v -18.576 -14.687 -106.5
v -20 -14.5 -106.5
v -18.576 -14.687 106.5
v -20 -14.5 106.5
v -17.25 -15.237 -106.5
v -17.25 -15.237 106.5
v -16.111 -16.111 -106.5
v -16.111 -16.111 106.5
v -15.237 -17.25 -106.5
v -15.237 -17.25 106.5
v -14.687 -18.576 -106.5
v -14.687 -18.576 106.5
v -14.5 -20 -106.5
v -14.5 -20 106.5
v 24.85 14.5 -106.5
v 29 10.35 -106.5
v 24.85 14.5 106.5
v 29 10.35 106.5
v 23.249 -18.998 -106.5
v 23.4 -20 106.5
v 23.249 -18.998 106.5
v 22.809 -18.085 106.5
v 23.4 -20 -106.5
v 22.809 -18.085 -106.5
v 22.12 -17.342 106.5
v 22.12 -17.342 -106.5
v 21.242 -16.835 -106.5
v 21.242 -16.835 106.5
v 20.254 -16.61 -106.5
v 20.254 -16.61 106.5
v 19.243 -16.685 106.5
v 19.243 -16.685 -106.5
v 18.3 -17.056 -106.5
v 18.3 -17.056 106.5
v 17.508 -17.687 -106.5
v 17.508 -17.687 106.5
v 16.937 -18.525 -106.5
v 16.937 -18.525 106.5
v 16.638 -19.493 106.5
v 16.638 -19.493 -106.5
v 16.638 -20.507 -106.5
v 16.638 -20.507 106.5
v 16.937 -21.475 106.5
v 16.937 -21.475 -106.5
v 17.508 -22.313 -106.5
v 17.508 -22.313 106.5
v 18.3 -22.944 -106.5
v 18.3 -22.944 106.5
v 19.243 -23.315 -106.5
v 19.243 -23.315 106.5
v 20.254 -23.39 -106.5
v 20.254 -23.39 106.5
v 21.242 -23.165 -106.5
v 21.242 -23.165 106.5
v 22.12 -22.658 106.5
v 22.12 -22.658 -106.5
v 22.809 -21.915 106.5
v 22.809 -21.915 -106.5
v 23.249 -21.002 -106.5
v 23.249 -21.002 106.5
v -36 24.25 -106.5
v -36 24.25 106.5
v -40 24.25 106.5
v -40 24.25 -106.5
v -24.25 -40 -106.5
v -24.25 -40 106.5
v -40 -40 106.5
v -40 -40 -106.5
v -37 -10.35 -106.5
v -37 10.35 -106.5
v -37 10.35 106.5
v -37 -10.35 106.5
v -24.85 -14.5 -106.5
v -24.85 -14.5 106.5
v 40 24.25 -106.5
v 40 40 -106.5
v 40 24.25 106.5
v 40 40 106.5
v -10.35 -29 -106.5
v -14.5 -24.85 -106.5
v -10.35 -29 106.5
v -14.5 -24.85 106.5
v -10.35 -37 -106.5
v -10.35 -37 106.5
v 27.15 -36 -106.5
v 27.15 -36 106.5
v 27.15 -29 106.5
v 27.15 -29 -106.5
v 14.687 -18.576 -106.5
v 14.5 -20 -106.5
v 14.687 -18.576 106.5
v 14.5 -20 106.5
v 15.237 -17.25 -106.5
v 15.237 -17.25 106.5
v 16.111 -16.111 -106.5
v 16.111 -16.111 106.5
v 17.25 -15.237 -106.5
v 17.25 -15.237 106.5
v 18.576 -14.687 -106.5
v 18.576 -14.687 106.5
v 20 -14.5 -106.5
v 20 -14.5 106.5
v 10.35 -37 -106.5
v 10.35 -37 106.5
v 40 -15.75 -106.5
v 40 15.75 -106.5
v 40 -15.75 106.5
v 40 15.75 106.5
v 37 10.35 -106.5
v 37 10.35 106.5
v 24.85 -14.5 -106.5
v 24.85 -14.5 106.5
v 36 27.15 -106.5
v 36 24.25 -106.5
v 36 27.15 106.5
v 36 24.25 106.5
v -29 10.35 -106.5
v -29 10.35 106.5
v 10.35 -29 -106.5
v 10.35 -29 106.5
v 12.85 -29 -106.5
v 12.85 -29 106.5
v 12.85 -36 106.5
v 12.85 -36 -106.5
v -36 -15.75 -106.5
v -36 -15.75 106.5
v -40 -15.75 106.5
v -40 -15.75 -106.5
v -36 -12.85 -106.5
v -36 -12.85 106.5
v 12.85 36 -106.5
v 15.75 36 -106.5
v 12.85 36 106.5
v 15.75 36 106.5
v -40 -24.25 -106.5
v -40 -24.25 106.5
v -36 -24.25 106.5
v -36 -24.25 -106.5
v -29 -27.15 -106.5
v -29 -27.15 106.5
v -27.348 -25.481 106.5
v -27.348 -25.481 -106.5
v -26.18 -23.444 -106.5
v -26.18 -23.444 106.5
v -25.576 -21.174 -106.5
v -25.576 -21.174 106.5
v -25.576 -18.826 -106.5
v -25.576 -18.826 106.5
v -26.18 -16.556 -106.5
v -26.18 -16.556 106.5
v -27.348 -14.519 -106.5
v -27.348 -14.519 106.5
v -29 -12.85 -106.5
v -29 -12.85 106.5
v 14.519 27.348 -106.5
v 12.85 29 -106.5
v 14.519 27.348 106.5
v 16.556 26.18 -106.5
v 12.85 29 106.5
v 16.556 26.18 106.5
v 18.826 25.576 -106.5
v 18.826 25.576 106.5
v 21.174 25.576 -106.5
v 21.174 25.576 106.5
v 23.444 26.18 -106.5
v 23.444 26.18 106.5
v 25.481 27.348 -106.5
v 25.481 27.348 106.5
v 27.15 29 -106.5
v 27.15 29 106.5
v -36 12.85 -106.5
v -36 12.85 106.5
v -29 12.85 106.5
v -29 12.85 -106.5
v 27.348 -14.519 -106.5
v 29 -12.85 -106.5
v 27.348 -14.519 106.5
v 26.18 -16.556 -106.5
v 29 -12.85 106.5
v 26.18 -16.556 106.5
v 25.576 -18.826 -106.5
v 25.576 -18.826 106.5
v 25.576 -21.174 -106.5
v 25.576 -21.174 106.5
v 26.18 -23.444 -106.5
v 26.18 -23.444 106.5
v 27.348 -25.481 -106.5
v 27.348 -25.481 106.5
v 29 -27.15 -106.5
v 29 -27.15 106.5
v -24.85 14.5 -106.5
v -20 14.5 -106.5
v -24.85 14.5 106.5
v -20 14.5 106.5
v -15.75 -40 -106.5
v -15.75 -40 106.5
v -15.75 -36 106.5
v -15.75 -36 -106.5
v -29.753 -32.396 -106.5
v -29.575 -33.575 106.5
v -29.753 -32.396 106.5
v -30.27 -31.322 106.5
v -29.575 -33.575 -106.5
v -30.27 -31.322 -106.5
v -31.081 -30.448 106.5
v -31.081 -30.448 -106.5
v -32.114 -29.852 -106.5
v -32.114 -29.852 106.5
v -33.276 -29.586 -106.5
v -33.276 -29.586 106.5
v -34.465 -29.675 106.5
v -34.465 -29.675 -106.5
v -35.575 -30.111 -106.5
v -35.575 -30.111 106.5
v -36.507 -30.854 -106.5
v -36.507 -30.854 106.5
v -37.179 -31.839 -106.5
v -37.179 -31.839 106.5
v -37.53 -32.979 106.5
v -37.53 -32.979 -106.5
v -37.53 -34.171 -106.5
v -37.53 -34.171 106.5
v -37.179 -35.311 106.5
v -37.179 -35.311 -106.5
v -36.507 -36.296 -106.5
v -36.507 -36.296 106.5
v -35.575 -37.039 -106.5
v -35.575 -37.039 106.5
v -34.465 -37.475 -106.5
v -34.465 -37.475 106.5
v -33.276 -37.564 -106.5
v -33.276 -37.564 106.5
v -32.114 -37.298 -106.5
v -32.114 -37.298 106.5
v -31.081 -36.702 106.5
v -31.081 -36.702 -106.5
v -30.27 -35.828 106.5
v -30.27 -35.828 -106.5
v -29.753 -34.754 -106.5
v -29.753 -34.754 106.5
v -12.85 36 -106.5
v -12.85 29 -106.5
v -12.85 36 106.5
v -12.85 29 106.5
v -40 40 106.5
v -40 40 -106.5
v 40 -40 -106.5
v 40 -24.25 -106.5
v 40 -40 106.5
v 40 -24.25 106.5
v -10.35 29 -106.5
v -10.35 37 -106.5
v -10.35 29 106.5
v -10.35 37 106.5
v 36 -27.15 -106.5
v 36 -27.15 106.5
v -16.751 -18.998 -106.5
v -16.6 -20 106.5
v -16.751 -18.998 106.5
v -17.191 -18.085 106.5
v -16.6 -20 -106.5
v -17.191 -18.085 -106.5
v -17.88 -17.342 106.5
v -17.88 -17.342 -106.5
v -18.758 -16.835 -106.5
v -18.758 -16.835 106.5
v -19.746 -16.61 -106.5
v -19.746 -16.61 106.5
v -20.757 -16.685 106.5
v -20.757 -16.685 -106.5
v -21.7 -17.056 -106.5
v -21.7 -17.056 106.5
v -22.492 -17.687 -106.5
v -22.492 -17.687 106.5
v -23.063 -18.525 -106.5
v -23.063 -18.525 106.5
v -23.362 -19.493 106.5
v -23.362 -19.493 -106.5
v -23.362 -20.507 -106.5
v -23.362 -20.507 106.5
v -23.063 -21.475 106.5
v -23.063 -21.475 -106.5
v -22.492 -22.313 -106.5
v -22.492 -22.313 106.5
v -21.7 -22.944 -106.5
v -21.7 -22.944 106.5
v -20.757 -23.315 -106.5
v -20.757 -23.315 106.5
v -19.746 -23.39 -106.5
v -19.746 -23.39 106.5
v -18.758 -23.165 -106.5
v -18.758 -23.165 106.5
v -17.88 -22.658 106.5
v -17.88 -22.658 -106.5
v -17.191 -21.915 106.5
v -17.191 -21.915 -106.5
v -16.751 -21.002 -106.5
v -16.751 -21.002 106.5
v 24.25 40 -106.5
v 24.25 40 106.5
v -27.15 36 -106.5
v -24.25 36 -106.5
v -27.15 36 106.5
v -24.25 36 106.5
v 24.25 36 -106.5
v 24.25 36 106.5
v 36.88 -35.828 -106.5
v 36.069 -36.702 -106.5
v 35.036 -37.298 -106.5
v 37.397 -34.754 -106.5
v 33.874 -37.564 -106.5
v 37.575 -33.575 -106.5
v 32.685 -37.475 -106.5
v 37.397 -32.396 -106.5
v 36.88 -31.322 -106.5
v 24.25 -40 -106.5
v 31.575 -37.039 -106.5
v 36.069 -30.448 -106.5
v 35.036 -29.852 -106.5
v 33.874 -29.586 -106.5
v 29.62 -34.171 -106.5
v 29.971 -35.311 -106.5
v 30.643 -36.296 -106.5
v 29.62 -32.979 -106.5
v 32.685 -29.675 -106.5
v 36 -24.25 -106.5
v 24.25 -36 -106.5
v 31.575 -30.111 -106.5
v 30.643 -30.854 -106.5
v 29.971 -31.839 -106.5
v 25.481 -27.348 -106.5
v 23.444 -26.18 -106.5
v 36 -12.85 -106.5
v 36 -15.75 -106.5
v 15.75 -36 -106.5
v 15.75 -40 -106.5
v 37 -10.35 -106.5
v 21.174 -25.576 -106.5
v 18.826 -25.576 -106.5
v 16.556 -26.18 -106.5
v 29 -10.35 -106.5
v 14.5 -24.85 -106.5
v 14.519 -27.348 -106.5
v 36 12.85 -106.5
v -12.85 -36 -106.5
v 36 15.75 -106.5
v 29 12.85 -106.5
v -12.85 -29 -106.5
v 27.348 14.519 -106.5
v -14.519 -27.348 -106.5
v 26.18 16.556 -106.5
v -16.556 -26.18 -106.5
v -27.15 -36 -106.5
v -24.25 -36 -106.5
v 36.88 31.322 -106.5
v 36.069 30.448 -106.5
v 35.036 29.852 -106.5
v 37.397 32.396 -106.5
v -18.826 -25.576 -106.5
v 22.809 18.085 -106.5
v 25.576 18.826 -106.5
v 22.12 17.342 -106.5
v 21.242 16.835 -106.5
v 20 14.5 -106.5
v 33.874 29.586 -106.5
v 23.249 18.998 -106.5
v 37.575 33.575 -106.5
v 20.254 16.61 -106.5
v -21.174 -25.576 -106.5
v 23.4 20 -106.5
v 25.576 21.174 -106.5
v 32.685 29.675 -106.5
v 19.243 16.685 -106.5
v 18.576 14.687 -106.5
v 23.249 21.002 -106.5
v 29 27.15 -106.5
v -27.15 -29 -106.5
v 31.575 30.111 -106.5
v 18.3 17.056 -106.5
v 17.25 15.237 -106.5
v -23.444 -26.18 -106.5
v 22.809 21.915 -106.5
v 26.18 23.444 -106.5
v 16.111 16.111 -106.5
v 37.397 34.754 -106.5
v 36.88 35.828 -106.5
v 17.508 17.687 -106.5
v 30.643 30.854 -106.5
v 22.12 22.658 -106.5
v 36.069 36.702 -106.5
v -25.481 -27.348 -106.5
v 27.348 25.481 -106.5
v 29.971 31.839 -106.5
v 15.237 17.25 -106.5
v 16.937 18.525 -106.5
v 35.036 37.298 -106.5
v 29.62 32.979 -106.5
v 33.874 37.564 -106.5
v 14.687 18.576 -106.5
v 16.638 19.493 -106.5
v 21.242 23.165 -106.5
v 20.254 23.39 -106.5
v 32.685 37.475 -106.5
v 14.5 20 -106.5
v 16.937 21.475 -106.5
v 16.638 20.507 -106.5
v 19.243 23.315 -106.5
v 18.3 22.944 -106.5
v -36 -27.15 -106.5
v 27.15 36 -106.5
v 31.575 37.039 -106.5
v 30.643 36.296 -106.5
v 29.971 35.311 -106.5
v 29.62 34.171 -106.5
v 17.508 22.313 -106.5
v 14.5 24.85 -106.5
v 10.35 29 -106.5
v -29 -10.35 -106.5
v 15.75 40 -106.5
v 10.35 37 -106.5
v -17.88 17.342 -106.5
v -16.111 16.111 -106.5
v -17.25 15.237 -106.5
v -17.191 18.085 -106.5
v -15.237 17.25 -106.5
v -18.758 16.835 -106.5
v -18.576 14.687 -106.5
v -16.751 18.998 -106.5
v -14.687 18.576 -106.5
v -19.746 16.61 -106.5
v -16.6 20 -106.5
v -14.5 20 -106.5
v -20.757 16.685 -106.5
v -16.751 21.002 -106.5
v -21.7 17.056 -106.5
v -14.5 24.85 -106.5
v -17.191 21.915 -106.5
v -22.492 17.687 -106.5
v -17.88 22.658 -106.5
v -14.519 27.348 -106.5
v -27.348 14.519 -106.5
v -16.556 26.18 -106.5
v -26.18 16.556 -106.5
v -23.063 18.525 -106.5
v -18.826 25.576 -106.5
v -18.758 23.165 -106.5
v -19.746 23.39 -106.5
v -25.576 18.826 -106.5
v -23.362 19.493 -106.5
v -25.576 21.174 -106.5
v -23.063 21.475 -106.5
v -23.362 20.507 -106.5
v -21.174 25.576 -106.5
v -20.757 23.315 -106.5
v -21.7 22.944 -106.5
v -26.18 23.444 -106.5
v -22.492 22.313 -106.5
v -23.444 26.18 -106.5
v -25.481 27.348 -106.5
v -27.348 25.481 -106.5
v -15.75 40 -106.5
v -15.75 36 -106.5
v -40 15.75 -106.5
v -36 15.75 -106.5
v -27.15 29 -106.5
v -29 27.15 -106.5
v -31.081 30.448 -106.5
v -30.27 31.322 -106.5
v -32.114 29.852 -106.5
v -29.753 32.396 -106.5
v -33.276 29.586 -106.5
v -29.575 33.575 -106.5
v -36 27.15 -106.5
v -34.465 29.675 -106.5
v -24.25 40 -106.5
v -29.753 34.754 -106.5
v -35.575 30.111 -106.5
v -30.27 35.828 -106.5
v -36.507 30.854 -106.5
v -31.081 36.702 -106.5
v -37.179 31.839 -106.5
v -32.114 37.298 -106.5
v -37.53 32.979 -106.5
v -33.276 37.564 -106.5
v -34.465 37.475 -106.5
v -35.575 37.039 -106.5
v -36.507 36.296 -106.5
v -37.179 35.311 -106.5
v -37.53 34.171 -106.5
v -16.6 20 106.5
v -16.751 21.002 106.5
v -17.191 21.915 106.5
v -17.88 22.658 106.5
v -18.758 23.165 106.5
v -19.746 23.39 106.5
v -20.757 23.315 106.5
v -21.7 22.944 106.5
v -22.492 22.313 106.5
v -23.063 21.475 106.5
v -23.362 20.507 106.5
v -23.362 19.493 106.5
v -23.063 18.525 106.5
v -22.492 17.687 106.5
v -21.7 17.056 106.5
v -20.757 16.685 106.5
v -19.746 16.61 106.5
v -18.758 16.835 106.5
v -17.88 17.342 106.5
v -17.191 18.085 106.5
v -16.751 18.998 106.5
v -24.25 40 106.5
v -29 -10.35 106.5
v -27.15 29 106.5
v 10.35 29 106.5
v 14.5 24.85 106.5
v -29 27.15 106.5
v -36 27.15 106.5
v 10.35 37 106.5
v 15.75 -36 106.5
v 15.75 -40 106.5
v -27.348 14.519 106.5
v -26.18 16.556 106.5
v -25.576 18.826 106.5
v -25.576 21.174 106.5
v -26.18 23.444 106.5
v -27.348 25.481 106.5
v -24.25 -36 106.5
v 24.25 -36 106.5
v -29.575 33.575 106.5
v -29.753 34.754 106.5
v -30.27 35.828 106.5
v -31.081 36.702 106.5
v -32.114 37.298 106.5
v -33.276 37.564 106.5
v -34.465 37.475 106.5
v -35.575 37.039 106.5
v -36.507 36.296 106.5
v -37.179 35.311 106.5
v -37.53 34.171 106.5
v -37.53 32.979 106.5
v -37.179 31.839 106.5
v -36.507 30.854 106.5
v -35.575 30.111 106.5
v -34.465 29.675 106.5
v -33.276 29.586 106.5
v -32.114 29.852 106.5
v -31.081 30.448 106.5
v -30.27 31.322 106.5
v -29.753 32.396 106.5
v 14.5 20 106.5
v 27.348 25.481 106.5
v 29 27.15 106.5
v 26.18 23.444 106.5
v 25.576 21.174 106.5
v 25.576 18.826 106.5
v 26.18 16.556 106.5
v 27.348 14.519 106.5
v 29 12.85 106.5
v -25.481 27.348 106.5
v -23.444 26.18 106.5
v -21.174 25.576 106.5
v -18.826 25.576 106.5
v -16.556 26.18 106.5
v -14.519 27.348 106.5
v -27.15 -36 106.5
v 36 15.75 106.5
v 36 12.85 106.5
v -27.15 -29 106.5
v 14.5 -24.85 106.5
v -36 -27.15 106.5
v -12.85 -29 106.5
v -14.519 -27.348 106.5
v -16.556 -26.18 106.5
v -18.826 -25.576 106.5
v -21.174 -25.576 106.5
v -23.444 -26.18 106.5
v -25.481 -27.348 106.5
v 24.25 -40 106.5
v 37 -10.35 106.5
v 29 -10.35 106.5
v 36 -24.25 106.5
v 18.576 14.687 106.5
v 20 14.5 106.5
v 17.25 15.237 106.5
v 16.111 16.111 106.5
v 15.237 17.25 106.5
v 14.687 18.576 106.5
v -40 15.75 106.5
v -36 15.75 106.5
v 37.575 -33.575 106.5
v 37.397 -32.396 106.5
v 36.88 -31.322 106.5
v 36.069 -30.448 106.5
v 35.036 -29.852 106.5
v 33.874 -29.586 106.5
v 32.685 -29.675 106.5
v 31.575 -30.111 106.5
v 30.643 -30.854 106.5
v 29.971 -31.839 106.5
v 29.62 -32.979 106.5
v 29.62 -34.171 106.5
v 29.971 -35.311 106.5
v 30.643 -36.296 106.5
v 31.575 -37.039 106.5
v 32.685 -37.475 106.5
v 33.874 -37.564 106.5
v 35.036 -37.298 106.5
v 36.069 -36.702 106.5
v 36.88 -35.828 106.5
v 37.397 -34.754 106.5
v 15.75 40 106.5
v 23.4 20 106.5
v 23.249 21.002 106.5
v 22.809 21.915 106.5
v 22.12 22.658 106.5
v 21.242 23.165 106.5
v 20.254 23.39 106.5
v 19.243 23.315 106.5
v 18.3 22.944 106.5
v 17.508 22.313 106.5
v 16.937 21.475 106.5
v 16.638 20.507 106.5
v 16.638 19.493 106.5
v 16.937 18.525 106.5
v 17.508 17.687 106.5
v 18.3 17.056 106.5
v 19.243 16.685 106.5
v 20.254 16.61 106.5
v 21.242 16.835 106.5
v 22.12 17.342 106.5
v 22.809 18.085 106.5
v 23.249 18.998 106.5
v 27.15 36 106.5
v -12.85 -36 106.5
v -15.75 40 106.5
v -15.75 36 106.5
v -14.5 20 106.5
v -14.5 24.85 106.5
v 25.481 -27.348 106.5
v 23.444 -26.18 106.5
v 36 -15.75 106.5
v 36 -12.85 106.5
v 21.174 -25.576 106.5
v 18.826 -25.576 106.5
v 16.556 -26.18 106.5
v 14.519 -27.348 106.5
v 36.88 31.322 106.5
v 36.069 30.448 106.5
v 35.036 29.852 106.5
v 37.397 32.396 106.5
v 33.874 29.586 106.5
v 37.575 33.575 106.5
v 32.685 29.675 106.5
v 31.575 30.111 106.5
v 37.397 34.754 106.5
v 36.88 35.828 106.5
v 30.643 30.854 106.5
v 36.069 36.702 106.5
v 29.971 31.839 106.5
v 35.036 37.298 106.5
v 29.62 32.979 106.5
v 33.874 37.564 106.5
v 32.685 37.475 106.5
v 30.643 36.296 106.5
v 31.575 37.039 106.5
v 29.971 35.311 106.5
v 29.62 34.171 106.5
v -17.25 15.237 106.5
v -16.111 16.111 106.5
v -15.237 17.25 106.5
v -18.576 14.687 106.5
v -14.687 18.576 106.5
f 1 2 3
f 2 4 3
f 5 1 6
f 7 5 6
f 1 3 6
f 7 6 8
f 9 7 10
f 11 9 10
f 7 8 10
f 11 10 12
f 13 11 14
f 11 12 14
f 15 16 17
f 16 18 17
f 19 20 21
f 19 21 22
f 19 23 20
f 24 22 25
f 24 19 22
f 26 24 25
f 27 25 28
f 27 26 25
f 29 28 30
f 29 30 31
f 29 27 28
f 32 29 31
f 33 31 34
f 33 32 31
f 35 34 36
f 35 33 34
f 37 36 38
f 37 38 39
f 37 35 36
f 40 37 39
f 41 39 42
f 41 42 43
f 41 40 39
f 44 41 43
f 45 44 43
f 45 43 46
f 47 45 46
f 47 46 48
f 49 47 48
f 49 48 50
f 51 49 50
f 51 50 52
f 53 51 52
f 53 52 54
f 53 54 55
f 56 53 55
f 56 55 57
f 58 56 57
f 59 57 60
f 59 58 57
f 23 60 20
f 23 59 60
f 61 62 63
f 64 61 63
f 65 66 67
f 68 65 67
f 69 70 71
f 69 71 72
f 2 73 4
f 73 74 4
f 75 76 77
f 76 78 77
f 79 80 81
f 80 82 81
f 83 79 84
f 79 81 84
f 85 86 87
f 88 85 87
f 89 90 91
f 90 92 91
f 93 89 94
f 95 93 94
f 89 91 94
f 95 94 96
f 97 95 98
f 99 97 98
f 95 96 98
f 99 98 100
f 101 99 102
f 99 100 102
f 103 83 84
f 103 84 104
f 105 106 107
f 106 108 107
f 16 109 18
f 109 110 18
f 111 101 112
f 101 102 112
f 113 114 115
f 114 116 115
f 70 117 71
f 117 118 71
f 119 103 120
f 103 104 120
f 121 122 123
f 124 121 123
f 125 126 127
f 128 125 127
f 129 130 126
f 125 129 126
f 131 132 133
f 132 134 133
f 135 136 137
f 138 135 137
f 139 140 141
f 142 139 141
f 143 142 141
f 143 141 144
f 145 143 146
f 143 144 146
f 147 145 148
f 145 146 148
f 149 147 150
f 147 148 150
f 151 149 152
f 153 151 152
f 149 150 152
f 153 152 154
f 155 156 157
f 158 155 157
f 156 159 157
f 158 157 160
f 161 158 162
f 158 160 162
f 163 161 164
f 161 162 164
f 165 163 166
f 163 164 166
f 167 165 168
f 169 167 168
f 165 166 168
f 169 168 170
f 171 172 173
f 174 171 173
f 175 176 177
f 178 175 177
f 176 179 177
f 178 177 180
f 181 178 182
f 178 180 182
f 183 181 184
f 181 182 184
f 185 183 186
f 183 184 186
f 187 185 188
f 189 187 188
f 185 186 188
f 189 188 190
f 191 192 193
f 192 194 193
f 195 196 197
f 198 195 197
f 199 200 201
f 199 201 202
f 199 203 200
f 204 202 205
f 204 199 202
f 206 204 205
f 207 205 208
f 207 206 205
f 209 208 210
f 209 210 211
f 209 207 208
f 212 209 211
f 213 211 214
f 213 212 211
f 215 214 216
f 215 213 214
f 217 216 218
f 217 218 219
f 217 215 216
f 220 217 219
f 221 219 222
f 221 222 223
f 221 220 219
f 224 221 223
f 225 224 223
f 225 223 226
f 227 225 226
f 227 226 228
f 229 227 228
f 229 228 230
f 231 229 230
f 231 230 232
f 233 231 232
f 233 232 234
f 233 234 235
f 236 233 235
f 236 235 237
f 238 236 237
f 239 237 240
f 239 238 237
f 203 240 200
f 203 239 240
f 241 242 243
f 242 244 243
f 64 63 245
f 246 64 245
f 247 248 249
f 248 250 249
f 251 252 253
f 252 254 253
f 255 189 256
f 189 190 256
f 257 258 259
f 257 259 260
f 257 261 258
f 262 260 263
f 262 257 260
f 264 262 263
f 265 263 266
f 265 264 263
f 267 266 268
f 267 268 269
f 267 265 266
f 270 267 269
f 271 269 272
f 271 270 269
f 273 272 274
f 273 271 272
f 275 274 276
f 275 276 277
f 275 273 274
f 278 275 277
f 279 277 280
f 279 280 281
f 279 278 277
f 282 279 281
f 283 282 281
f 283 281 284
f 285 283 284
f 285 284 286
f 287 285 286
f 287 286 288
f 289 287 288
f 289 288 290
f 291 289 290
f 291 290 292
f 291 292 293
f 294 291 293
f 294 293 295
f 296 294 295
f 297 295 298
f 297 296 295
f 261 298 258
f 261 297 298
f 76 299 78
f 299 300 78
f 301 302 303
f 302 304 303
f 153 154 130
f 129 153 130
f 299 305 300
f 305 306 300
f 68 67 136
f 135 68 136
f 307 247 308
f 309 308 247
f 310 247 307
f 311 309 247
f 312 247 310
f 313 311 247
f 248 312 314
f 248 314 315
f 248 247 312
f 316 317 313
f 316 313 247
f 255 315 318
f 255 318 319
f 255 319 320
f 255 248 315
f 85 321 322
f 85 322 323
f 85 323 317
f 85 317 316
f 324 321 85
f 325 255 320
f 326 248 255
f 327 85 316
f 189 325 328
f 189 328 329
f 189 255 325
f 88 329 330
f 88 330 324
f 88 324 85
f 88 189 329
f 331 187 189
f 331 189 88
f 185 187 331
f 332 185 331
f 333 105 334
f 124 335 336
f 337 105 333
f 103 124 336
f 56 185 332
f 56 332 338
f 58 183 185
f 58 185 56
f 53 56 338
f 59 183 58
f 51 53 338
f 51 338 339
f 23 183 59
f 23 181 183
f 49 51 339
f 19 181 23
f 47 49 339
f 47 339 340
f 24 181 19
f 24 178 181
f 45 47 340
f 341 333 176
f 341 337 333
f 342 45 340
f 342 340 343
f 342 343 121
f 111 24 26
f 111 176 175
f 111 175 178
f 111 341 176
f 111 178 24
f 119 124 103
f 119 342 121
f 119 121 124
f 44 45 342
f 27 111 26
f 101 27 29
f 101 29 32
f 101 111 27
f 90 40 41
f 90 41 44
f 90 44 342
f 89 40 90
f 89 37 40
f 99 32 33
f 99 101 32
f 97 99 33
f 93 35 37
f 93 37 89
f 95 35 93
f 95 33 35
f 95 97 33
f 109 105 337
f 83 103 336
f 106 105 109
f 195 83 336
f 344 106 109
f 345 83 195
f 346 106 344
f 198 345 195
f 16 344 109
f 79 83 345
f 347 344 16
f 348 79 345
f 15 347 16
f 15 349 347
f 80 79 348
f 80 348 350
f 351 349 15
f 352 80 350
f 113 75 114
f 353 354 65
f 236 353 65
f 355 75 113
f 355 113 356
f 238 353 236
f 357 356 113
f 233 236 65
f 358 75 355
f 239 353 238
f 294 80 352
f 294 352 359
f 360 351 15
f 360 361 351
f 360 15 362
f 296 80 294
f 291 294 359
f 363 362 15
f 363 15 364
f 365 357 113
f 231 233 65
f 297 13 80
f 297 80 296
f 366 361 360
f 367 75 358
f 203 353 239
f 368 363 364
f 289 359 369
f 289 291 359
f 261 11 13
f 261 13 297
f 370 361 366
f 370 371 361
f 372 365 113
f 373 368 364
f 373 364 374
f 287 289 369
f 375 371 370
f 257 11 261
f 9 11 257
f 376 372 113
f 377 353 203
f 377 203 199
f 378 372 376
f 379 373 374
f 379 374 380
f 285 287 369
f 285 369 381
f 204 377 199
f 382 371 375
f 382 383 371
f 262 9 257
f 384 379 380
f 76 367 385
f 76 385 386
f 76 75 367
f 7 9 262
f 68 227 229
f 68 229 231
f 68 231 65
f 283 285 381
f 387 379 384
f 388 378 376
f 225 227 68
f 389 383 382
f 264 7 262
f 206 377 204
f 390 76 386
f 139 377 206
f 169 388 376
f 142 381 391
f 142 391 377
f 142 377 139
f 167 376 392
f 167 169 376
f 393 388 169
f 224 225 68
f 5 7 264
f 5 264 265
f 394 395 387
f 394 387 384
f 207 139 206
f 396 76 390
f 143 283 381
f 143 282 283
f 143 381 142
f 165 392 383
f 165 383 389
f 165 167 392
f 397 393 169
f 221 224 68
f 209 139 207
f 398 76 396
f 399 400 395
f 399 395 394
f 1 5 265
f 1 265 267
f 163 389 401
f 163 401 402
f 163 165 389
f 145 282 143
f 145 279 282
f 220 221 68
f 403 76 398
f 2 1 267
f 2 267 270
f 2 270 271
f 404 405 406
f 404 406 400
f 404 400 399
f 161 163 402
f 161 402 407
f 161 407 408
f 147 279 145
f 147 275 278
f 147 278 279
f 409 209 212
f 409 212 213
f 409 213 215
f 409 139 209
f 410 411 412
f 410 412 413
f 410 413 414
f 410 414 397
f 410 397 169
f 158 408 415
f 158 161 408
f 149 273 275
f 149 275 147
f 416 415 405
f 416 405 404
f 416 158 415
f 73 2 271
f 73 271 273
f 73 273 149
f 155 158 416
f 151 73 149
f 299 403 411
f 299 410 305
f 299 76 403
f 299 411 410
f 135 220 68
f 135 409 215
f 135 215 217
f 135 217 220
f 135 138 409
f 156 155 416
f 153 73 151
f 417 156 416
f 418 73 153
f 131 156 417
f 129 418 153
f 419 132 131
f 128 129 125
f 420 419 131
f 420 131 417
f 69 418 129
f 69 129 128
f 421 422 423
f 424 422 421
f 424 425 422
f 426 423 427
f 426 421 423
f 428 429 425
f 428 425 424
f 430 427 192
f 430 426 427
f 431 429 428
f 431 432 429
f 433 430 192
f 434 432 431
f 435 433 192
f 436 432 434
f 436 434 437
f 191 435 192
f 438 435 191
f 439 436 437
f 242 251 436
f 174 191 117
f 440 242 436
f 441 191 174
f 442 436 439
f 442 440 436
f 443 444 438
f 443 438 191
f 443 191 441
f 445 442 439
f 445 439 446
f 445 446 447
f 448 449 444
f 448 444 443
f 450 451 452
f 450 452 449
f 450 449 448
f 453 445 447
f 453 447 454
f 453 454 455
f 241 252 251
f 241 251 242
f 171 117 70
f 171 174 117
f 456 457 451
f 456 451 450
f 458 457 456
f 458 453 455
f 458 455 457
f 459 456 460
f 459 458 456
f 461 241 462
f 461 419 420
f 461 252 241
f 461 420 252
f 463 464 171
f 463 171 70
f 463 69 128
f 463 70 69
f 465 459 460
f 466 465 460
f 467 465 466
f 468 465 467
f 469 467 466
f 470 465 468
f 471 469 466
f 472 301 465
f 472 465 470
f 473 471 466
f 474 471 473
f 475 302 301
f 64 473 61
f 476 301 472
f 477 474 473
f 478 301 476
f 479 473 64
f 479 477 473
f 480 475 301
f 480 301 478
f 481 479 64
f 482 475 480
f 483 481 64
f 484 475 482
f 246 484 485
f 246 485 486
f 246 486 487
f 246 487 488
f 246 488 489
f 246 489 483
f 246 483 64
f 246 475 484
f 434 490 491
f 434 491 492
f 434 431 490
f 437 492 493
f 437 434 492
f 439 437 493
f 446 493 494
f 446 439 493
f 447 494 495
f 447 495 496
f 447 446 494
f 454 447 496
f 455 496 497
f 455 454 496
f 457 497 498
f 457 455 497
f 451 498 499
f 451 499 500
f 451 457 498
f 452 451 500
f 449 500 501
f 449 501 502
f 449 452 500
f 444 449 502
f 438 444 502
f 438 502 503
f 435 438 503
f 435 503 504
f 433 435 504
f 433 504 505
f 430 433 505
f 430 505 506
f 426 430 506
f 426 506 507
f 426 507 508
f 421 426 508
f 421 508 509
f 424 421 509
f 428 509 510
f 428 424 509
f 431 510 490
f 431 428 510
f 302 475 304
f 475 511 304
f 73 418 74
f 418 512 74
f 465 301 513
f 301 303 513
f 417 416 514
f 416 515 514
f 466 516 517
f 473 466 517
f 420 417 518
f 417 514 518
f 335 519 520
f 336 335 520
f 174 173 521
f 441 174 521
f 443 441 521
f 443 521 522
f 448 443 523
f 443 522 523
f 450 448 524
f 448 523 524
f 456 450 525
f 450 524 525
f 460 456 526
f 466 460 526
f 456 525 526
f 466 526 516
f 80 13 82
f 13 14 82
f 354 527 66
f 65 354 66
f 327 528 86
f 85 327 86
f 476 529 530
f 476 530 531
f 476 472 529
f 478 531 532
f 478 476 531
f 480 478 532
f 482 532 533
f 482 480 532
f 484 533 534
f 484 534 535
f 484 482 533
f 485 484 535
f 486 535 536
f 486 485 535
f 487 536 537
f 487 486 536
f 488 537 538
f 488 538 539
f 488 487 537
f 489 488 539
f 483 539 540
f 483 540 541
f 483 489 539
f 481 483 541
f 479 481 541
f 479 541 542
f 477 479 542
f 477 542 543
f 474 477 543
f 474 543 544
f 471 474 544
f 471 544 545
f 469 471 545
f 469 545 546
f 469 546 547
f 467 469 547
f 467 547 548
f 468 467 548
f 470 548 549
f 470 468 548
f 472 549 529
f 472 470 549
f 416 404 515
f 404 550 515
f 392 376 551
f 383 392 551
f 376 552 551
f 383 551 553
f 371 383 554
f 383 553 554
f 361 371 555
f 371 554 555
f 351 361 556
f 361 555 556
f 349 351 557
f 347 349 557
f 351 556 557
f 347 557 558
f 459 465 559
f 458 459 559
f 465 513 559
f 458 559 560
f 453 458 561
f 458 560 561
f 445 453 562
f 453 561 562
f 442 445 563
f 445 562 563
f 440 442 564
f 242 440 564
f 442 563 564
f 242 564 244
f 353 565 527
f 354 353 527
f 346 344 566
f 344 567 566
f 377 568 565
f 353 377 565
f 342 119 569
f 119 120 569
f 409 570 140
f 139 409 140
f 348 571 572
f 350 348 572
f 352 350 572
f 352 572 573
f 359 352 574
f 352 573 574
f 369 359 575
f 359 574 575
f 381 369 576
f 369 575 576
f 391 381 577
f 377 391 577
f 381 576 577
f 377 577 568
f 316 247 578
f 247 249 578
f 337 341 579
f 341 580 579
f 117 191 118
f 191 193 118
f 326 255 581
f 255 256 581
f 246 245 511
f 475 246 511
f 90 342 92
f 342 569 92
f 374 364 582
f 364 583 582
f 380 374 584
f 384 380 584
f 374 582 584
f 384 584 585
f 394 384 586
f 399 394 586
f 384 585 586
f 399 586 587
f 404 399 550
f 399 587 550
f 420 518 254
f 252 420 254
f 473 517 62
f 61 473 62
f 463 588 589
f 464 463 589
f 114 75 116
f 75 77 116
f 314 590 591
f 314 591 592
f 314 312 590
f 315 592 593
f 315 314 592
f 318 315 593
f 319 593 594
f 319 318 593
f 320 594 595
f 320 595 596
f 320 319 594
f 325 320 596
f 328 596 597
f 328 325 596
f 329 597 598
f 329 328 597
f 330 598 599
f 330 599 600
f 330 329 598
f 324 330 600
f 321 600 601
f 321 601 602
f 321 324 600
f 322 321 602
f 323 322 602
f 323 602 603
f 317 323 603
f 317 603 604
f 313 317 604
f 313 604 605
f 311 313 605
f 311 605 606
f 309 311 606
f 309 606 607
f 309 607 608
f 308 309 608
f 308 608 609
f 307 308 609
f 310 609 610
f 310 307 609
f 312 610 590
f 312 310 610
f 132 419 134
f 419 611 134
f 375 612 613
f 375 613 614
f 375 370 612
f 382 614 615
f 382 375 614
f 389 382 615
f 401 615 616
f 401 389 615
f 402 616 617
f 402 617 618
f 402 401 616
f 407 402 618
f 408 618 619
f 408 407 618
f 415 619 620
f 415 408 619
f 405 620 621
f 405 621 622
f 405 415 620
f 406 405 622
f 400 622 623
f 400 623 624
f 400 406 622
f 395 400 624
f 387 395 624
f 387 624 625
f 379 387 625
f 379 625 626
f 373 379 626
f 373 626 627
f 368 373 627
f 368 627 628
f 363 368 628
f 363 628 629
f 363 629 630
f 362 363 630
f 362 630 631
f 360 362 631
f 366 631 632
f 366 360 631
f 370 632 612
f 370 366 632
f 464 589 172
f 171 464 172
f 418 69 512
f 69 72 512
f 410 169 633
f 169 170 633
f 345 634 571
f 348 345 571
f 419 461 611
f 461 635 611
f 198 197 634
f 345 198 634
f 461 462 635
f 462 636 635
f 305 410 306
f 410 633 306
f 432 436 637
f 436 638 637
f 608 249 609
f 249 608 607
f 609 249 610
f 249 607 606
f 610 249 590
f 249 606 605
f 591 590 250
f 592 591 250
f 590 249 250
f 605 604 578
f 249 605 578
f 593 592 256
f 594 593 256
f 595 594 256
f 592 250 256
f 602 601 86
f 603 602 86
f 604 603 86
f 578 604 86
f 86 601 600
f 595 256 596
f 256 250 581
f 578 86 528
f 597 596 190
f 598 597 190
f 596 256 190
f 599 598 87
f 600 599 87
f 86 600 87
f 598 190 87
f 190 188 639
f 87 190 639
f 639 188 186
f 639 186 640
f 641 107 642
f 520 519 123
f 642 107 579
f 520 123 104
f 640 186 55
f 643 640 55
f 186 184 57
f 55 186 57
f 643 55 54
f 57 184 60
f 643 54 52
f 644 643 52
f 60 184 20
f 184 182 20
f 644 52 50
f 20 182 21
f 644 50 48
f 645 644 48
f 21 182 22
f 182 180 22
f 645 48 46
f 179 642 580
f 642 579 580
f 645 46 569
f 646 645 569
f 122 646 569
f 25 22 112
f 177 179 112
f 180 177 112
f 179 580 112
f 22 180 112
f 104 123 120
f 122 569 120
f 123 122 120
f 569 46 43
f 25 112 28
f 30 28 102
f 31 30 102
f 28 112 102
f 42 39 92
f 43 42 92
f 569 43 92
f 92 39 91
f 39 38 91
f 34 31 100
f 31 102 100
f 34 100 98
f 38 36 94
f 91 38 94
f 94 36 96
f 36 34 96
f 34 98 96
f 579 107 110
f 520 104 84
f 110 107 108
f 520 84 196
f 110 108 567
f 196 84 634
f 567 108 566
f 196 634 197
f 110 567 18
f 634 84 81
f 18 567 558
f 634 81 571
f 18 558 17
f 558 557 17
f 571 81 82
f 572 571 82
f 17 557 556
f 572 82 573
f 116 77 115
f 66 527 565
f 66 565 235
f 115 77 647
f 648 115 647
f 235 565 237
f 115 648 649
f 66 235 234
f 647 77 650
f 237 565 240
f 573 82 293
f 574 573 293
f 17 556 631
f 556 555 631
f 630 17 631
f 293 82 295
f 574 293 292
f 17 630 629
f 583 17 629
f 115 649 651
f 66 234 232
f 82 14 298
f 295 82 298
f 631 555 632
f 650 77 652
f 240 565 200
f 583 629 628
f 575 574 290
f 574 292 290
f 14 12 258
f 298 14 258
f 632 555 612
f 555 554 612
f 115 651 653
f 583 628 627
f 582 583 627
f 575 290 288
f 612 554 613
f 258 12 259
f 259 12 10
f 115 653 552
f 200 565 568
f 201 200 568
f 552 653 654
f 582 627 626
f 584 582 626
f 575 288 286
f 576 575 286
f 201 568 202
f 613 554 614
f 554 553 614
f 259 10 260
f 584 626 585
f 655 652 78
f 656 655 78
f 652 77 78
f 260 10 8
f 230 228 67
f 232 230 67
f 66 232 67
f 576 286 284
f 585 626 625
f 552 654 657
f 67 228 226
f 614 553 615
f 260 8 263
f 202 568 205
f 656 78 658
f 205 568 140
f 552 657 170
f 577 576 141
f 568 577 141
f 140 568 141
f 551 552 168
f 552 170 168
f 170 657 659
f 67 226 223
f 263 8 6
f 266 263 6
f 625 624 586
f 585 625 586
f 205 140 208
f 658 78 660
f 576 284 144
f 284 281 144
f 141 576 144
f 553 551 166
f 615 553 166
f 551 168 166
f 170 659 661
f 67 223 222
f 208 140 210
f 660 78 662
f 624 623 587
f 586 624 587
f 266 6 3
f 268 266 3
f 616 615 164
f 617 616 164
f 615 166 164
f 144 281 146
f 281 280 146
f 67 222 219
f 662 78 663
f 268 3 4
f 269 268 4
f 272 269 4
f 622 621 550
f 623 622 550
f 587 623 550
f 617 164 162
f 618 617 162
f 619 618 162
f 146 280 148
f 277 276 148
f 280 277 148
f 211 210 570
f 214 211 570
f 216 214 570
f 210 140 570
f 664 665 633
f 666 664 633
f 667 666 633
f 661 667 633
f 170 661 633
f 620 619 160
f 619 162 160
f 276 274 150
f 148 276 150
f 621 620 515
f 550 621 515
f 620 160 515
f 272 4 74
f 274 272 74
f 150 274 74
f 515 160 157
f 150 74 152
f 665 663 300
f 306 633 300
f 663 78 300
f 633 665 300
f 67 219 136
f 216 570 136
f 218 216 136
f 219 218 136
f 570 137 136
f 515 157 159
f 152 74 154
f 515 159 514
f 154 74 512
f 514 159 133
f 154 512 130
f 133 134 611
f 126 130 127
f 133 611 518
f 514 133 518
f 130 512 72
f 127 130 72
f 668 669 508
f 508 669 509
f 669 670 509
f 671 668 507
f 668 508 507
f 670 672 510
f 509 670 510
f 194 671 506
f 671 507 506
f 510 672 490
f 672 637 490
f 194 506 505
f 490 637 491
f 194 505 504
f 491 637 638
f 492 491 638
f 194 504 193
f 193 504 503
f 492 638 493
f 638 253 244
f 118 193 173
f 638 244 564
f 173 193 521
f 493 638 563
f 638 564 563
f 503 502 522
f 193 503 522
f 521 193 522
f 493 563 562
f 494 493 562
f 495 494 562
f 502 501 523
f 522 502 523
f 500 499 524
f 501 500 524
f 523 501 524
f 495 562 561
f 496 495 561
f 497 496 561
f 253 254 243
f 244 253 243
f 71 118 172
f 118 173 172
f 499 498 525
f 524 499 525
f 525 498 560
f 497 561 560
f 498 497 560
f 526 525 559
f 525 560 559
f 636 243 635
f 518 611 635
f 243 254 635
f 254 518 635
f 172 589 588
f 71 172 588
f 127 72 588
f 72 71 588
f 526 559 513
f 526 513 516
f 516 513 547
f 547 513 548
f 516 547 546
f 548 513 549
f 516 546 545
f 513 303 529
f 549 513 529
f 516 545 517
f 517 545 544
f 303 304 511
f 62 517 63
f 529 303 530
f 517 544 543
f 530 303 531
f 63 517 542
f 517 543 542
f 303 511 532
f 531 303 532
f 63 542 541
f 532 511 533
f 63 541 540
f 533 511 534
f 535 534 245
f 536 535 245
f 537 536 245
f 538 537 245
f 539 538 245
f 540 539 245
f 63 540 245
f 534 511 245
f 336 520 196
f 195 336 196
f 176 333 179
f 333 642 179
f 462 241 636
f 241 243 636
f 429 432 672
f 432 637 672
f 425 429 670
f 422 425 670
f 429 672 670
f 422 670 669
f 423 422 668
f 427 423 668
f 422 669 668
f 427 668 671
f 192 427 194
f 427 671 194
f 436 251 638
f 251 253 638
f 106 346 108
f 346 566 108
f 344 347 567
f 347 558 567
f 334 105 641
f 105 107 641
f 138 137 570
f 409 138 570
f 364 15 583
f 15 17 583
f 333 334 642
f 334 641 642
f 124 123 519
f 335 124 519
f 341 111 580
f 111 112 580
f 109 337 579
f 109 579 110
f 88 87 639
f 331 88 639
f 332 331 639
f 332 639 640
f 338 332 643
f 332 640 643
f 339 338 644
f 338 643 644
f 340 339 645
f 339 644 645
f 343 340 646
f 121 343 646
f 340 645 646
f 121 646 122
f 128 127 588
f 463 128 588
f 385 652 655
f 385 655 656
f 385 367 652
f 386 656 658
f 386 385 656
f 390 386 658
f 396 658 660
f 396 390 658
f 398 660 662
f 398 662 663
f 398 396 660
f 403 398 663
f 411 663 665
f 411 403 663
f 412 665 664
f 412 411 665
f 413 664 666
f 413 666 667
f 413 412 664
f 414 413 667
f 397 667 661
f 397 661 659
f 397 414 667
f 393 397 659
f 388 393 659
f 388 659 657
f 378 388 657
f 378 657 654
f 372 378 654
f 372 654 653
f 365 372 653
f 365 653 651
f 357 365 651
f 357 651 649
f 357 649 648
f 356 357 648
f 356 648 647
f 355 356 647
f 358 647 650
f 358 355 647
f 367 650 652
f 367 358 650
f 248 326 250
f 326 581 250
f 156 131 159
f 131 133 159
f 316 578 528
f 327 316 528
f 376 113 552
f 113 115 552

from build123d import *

# Parameters (mm, degrees)
SKETCH_1_R      = 3.4
SKETCH_1_R_2    = 4
EXTRUDE_1_DEPTH = 106.5


with BuildPart() as part:
    # 草图1 → 凸台-拉伸1 (new, symmetric)
    with BuildSketch(Plane.XY):
        with BuildLine():
            Line((-40, 40), (-24.25, 40))
            Line((-24.25, 40), (-24.25, 36))
            Line((-24.25, 36), (-27.15, 36))
            Line((-27.15, 36), (-27.15, 29))
            ThreePointArc((-27.15, 29), (-20, 25.5), (-12.85, 29))
            Line((-12.85, 29), (-12.85, 36))
            Line((-12.85, 36), (-15.75, 36))
            Line((-15.75, 36), (-15.75, 40))
            Line((-15.75, 40), (15.75, 40))
            Line((15.75, 40), (15.75, 36))
            Line((15.75, 36), (12.85, 36))
            Line((12.85, 36), (12.85, 29))
            ThreePointArc((12.85, 29), (20, 25.5), (27.15, 29))
            Line((27.15, 29), (27.15, 36))
            Line((27.15, 36), (24.25, 36))
            Line((24.25, 36), (24.25, 40))
            Line((24.25, 40), (40, 40))
            Line((40, 40), (40, 24.25))
            Line((40, 24.25), (36, 24.25))
            Line((36, 24.25), (36, 27.15))
            Line((36, 27.15), (29, 27.15))
            ThreePointArc((29, 27.15), (25.5, 20), (29, 12.85))
            Line((29, 12.85), (36, 12.85))
            Line((36, 12.85), (36, 15.75))
            Line((36, 15.75), (40.000271684, 15.75))
            Line((40.000271684, 15.75), (40.000271684, -15.75))
            Line((40.000271684, -15.75), (36, -15.75))
            Line((36, -15.75), (36, -12.85))
            Line((36, -12.85), (29, -12.85))
            ThreePointArc((29, -12.85), (25.5, -20), (29, -27.15))
            Line((29, -27.15), (36, -27.15))
            Line((36, -27.15), (36, -24.25))
            Line((36, -24.25), (40, -24.25))
            Line((40, -24.25), (40, -40))
            Line((40, -40), (24.25, -40))
            Line((24.25, -40), (24.25, -36))
            Line((24.25, -36), (27.15, -36))
            Line((27.15, -36), (27.15, -29))
            ThreePointArc((27.15, -29), (20, -25.5), (12.85, -29))
            Line((12.85, -29), (12.85, -36))
            Line((12.85, -36), (15.75, -36))
            Line((15.75, -36), (15.75, -40))
            Line((15.75, -40), (-15.75, -40))
            Line((-15.75, -40), (-15.75, -36))
            Line((-15.75, -36), (-12.85, -36))
            Line((-12.85, -36), (-12.85, -29))
            ThreePointArc((-12.85, -29), (-20, -25.5), (-27.15, -29))
            Line((-27.15, -29), (-27.15, -36))
            Line((-27.15, -36), (-24.25, -36))
            Line((-24.25, -36), (-24.25, -40))
            Line((-24.25, -40), (-40, -40))
            Line((-40, -40), (-40, -24.25))
            Line((-40, -24.25), (-36, -24.25))
            Line((-36, -24.25), (-36, -27.15))
            Line((-36, -27.15), (-29, -27.15))
            ThreePointArc((-29, -27.15), (-25.5, -20), (-29, -12.85))
            Line((-29, -12.85), (-36, -12.85))
            Line((-36, -12.85), (-36, -15.75))
            Line((-36, -15.75), (-40.000271684, -15.75))
            Line((-40.000271684, -15.75), (-40.000271684, 15.75))
            Line((-40.000271684, 15.75), (-36, 15.75))
            Line((-36, 15.75), (-36, 12.85))
            Line((-36, 12.85), (-29, 12.85))
            ThreePointArc((-29, 12.85), (-25.5, 20), (-29, 27.15))
            Line((-29, 27.15), (-36, 27.15))
            Line((-36, 27.15), (-36, 24.25))
            Line((-36, 24.25), (-40, 24.25))
            Line((-40, 24.25), (-40, 40))
        make_face()
        with Locations((-20, 20)):
            Circle(SKETCH_1_R, mode=Mode.SUBTRACT)
        with Locations((-33.575, 33.575)):
            Circle(SKETCH_1_R_2, mode=Mode.SUBTRACT)
        with Locations((33.575, 33.575)):
            Circle(SKETCH_1_R_2, mode=Mode.SUBTRACT)
        with Locations((20, 20)):
            Circle(SKETCH_1_R, mode=Mode.SUBTRACT)
        with Locations((20, -20)):
            Circle(SKETCH_1_R, mode=Mode.SUBTRACT)
        with Locations((33.575, -33.575)):
            Circle(SKETCH_1_R_2, mode=Mode.SUBTRACT)
        with Locations((-33.575, -33.575)):
            Circle(SKETCH_1_R_2, mode=Mode.SUBTRACT)
        with Locations((-20, -20)):
            Circle(SKETCH_1_R, mode=Mode.SUBTRACT)
        with BuildLine():
            Line((10.35, 37), (-10.35, 37))
            Line((-10.35, 37), (-10.35, 29))
            Line((-10.35, 29), (-14.5, 24.85))
            Line((-14.5, 24.85), (-14.5, 20))
            ThreePointArc((-14.5, 20), (-16.110912703, 16.110912703), (-20, 14.5))
            Line((-20, 14.5), (-24.85, 14.5))
            Line((-24.85, 14.5), (-29, 10.35))
            Line((-29, 10.35), (-37, 10.35))
            Line((-37, 10.35), (-37, -10.35))
            Line((-37, -10.35), (-29, -10.35))
            Line((-29, -10.35), (-24.85, -14.5))
            Line((-24.85, -14.5), (-20, -14.5))
            ThreePointArc((-20, -14.5), (-16.110912703, -16.110912703), (-14.5, -20))
            Line((-14.5, -20), (-14.5, -24.85))
            Line((-14.5, -24.85), (-10.35, -29))
            Line((-10.35, -29), (-10.35, -37))
            Line((-10.35, -37), (10.35, -37))
            Line((10.35, -37), (10.35, -29))
            Line((10.35, -29), (14.5, -24.85))
            Line((14.5, -24.85), (14.5, -20))
            ThreePointArc((14.5, -20), (16.110912703, -16.110912703), (20, -14.5))
            Line((20, -14.5), (24.85, -14.5))
            Line((24.85, -14.5), (29, -10.35))
            Line((29, -10.35), (37, -10.35))
            Line((37, -10.35), (37, 10.35))
            Line((37, 10.35), (29, 10.35))
            Line((29, 10.35), (24.85, 14.5))
            Line((24.85, 14.5), (20, 14.5))
            ThreePointArc((20, 14.5), (16.110912703, 16.110912703), (14.5, 20))
            Line((14.5, 20), (14.5, 24.85))
            Line((14.5, 24.85), (10.35, 29))
            Line((10.35, 29), (10.35, 37))
        make_face(mode=Mode.SUBTRACT)
    extrude(amount=EXTRUDE_1_DEPTH, both=True)


solid = part.part
